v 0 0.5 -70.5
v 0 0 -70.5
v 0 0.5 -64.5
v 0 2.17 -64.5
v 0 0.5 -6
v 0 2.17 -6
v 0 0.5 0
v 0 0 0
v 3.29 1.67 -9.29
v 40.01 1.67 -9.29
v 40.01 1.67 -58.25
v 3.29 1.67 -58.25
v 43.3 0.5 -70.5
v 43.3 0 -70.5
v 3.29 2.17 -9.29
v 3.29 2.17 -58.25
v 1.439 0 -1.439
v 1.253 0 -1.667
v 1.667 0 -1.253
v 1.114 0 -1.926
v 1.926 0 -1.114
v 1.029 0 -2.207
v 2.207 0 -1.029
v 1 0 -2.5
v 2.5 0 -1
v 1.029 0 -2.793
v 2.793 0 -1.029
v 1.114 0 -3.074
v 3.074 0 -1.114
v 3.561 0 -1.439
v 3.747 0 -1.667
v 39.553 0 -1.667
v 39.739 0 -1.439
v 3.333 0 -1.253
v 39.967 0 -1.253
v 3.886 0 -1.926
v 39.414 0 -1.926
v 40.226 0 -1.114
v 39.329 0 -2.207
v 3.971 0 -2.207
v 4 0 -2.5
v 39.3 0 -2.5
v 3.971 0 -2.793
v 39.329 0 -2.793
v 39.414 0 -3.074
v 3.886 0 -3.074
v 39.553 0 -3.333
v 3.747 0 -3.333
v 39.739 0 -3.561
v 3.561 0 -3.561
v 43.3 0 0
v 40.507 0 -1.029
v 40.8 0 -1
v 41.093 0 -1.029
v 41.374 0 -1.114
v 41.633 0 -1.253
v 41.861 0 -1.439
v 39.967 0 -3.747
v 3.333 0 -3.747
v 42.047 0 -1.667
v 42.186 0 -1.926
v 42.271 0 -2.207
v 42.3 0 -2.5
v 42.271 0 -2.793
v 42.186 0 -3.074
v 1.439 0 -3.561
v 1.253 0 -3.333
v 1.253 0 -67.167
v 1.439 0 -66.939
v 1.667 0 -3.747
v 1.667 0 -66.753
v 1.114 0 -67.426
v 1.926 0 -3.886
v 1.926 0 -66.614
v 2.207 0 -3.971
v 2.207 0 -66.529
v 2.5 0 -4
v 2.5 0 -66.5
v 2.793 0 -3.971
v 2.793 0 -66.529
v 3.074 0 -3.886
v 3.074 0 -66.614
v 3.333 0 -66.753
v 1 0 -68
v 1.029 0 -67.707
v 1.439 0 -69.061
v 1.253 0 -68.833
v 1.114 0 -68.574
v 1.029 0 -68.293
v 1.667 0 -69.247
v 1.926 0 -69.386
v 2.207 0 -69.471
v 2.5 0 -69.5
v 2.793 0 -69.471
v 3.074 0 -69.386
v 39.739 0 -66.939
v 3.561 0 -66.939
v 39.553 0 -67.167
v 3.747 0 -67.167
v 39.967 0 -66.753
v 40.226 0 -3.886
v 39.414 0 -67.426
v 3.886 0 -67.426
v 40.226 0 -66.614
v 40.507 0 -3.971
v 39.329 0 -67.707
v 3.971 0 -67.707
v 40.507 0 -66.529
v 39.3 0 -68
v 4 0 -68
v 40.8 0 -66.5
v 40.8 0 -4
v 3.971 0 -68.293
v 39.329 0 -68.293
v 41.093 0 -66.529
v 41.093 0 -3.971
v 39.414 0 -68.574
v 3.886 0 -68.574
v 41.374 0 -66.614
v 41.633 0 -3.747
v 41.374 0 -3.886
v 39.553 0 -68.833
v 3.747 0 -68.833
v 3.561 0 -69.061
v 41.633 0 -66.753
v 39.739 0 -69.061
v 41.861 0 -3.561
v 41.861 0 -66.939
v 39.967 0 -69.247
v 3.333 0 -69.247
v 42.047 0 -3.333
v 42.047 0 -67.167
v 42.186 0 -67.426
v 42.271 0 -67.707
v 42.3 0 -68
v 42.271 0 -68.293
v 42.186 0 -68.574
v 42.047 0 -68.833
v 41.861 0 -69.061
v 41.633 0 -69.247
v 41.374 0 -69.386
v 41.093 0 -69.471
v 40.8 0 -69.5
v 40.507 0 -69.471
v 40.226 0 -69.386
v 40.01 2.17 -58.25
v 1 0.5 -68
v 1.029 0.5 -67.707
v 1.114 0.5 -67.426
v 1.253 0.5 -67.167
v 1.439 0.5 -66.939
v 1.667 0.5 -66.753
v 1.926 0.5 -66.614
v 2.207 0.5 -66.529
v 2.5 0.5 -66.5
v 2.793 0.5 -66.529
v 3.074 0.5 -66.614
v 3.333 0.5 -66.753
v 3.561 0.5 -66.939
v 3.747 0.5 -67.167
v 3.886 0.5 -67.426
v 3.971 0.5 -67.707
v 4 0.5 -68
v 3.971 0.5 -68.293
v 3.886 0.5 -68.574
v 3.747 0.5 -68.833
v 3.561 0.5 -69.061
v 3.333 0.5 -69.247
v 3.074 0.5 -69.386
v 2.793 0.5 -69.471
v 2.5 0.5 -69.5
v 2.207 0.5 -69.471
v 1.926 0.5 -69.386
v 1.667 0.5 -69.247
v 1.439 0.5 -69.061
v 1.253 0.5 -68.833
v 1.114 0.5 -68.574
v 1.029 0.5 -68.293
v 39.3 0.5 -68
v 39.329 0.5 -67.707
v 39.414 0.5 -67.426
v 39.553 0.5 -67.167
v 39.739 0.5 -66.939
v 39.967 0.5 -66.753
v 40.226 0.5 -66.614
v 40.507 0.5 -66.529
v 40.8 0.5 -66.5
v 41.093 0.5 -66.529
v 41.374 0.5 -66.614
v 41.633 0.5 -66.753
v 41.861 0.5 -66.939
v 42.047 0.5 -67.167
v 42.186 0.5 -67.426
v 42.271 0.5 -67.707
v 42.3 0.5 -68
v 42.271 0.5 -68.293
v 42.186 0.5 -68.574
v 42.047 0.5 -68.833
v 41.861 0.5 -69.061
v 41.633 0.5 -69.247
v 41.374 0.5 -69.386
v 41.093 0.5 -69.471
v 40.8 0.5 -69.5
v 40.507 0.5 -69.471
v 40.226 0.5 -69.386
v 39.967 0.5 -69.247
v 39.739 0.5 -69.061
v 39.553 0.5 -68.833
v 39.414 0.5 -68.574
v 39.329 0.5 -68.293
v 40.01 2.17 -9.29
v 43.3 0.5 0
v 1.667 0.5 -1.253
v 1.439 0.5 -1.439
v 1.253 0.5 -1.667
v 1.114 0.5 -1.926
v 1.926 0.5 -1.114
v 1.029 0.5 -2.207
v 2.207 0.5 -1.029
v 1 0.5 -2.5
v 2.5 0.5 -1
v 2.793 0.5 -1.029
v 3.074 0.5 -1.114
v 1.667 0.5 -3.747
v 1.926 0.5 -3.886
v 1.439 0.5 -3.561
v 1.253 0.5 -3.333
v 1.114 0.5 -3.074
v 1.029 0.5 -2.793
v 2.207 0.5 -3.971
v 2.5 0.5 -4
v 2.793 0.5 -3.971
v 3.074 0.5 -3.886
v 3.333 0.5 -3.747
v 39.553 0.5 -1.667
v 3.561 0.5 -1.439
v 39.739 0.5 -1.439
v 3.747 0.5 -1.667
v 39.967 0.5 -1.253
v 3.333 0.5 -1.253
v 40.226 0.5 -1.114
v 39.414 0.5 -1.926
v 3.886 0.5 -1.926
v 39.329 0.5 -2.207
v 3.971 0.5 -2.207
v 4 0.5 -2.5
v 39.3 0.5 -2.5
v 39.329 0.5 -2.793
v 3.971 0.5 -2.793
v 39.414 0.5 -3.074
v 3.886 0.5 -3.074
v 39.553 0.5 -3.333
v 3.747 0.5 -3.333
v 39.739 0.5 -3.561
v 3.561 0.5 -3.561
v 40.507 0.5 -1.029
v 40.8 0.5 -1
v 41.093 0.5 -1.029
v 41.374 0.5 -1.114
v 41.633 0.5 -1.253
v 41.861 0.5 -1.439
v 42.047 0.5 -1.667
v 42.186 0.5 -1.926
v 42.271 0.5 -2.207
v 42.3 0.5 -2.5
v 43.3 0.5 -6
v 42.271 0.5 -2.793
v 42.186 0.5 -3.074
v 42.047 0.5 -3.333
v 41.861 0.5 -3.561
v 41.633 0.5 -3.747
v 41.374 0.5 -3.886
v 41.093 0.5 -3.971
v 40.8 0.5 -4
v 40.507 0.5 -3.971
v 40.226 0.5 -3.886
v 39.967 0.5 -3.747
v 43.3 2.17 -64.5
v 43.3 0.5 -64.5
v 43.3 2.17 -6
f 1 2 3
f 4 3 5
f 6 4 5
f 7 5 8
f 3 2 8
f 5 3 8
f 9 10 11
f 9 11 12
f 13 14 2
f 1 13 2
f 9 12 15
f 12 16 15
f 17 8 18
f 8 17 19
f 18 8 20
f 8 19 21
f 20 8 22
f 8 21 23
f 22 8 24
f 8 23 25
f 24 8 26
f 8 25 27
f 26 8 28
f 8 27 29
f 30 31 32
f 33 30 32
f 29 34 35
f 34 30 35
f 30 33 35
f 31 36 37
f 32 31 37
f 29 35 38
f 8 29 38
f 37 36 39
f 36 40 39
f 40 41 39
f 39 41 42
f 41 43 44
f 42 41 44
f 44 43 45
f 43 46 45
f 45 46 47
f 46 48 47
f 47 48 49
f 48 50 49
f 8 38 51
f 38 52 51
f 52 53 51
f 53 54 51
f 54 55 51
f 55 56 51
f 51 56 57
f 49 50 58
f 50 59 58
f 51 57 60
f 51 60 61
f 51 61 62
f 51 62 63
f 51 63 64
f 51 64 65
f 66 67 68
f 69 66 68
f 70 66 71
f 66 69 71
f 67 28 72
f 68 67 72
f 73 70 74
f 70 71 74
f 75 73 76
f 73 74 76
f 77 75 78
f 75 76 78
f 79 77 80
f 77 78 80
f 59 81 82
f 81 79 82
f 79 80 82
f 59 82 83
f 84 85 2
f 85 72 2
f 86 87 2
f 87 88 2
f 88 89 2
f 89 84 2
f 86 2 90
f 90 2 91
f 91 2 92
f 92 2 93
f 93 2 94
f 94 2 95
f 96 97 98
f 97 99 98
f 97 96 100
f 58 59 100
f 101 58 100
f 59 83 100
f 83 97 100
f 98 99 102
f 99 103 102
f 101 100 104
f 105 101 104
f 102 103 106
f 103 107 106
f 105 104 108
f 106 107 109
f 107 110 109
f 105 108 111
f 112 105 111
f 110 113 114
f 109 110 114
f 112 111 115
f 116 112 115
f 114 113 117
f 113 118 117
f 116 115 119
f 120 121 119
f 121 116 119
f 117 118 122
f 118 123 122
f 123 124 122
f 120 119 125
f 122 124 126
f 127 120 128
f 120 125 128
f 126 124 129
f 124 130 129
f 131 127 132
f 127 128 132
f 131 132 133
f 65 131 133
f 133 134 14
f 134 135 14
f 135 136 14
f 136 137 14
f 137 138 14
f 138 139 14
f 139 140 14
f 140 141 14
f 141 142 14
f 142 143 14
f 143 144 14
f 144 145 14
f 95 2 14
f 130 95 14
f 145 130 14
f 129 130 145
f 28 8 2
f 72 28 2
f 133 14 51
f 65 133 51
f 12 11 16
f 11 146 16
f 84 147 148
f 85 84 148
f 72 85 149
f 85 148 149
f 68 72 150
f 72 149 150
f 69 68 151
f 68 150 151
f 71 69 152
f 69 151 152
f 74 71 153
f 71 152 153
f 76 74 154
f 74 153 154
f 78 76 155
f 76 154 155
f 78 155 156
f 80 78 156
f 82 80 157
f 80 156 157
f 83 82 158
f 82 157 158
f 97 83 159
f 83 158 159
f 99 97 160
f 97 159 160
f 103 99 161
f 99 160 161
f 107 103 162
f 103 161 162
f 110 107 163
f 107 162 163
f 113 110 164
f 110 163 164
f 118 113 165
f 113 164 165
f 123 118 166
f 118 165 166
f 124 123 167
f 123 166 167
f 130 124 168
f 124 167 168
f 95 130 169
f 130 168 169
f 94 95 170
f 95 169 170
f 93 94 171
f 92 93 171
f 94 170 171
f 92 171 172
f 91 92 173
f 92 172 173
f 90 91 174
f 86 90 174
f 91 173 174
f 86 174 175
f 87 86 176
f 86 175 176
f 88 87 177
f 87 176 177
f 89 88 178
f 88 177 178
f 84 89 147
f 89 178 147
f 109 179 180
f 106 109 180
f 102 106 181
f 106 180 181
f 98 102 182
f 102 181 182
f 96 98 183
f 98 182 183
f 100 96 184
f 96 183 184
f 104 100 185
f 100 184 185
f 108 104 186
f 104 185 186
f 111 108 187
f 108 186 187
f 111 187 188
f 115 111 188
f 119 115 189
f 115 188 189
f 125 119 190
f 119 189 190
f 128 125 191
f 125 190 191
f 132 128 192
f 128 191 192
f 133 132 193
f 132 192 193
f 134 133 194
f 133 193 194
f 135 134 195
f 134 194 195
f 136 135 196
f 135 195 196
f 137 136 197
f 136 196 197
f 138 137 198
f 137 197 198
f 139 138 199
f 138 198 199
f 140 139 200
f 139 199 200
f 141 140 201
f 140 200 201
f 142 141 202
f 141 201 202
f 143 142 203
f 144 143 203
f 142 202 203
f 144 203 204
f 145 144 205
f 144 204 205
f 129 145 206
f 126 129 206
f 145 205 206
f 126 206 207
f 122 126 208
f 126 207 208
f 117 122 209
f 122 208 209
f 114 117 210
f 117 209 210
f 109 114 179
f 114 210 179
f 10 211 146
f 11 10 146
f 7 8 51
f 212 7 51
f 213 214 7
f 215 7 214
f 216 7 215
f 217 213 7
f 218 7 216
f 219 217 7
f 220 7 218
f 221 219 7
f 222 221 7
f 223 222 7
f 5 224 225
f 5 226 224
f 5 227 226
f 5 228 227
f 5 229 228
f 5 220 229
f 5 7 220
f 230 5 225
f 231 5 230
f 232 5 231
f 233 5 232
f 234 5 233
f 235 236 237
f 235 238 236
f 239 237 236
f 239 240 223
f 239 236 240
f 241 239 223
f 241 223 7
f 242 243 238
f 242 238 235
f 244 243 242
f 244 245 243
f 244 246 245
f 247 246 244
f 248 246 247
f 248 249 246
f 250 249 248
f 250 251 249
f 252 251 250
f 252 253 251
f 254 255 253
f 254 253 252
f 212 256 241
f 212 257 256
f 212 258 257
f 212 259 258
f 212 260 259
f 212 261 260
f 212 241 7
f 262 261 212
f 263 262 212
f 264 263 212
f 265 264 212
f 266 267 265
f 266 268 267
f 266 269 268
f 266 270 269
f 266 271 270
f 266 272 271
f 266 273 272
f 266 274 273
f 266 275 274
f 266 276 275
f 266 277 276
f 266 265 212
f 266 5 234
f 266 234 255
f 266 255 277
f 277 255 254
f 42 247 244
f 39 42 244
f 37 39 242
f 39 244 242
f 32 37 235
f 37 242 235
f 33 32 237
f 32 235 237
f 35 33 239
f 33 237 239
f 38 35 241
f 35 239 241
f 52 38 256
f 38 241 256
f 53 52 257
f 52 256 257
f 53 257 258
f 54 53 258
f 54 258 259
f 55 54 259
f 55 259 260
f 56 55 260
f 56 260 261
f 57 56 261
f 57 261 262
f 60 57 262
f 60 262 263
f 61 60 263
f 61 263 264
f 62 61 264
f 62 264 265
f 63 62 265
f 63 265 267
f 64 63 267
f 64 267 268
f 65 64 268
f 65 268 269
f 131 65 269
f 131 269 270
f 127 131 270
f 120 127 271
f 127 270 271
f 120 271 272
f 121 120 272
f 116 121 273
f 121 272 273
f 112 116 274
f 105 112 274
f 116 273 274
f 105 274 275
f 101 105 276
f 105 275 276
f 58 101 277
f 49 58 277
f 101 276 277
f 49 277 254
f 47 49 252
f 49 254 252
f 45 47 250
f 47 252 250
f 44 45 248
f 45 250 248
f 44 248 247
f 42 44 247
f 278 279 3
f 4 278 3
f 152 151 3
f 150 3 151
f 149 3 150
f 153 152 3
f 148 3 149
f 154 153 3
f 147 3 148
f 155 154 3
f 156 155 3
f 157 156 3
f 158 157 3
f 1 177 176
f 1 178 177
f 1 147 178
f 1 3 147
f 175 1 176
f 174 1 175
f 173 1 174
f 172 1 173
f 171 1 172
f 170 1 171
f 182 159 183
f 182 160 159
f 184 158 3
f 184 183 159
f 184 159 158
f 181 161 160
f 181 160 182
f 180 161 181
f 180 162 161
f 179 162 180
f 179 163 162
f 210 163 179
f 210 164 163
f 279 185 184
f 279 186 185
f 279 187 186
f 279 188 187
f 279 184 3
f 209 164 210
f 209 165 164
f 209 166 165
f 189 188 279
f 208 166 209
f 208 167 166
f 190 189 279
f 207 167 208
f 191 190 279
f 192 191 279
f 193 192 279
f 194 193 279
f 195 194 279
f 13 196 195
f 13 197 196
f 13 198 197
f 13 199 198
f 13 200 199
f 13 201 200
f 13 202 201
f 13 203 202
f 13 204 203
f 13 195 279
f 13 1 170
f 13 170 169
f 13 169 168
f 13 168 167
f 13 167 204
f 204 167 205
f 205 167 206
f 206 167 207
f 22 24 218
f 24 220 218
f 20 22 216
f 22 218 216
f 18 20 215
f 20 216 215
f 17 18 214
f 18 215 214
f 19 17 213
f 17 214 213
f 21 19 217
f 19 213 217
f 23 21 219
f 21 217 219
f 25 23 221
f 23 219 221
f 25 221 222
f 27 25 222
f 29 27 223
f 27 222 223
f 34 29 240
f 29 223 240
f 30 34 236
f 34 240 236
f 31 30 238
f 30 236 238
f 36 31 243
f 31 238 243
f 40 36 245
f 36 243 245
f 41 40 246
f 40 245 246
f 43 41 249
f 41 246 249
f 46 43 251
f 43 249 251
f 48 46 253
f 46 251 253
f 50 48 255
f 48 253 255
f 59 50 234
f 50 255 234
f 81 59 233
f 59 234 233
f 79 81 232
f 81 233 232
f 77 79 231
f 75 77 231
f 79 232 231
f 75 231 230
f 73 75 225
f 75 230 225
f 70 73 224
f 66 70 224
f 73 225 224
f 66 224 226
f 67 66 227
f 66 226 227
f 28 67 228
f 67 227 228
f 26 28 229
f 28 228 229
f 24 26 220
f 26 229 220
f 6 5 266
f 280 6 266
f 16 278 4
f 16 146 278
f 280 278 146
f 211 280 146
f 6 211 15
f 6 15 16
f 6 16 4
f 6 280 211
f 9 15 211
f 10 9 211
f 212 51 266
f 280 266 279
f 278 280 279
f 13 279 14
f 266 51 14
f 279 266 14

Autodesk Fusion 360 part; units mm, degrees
sketch "Sketch1" plane through (0, 0, 0) normal (0, 1, 0) x (1, 0, 0)
  line L0 (0, 0) -> (43.3, 0)
  line L1 (43.3, 0) -> (43.3, 70.5)
  line L2 (43.3, 70.5) -> (0, 70.5)
  line L3 (0, 70.5) -> (0, 0)
  dimension "d1" = 43.3
  dimension "d2" = 70.5
extrude "Extrude1" add sketch "Sketch1" along normal blind 0.5
sketch "Sketch2" plane through (0, 0.5, 0) normal (0, 1, 0) x (-1, 0, 0)
  line L0 (0, -70.5) -> (0, 0)
  line L1 (0, 0) -> (-43.3, 0)
  line L2 (-43.3, 0) -> (-43.3, -70.5)
  line L3 (-43.3, -70.5) -> (0, -70.5) construction
  line L4 (-43.3, 0) -> (-43.3, -5) construction
  line L5 (-43.3, -70.5) -> (-43.3, -64.5) construction
  line L6 (-43.3, -64.5) -> (0, -64.5)
  line L7 (0, -64.5) -> (0, -6)
  line L8 (0, -6) -> (-43.3, -6)
  line L9 (-43.3, -6) -> (-43.3, -64.5)
  line L10 (0, -2.5) -> (-2.5, -2.5) construction
  line L11 (-43.3, -2.5) -> (-40.8, -2.5) construction
  circle A0 centre (-2.5, -68) radius 1.5
  circle A1 centre (-40.8, -68) radius 1.5
  circle A2 centre (-40.8, -2.5) radius 1.5
  circle A3 centre (-2.5, -2.5) radius 1.5
  dimension "d5" = 6
  dimension "d8" = 2.5
  dimension "d10" = 3
  dimension "d11" = 3
  dimension "d12" = 3
  dimension "d13" = 3
  dimension "d16" = 2.5
  dimension "d17" = 2.5
  dimension "d18" = 2.5
  dimension "d19" = 2.5
  dimension "d20" = 2.5
  dimension "d21" = 2.5
  dimension "d22" = 2.5
extrude "Extrude2" add sketch "Sketch2" along normal blind 1.67 contours L0 L2 L6 L7 L8 L9
extrude "Extrude3" cut sketch "Sketch2" against normal blind 5.737 contours A0 | A1 | A2 | A3
sketch "Sketch3" plane through (0, 2.17, 0) normal (0, 1, 0) x (-1, 0, 0)
  line L0 (-43.3, -6) -> (-43.3, -64.5)
  line L1 (-43.3, -64.5) -> (0, -64.5)
  line L2 (0, -64.5) -> (0, -6)
  line L3 (0, -6) -> (-43.3, -6)
  line L4 (-3.29, -9.29) -> (-40.01, -9.29)
  line L5 (-40.01, -9.29) -> (-40.01, -58.25)
  line L6 (-40.01, -58.25) -> (-3.29, -58.25)
  line L7 (-3.29, -58.25) -> (-3.29, -9.29)
  dimension "d23" = 36.72
  dimension "d24" = 48.96
  dimension "d25" = 3.29
  dimension "d26" = 3.29
extrude "Extrude4" cut sketch "Sketch3" against normal blind 0.5 contours L4 L5 L6 L7
